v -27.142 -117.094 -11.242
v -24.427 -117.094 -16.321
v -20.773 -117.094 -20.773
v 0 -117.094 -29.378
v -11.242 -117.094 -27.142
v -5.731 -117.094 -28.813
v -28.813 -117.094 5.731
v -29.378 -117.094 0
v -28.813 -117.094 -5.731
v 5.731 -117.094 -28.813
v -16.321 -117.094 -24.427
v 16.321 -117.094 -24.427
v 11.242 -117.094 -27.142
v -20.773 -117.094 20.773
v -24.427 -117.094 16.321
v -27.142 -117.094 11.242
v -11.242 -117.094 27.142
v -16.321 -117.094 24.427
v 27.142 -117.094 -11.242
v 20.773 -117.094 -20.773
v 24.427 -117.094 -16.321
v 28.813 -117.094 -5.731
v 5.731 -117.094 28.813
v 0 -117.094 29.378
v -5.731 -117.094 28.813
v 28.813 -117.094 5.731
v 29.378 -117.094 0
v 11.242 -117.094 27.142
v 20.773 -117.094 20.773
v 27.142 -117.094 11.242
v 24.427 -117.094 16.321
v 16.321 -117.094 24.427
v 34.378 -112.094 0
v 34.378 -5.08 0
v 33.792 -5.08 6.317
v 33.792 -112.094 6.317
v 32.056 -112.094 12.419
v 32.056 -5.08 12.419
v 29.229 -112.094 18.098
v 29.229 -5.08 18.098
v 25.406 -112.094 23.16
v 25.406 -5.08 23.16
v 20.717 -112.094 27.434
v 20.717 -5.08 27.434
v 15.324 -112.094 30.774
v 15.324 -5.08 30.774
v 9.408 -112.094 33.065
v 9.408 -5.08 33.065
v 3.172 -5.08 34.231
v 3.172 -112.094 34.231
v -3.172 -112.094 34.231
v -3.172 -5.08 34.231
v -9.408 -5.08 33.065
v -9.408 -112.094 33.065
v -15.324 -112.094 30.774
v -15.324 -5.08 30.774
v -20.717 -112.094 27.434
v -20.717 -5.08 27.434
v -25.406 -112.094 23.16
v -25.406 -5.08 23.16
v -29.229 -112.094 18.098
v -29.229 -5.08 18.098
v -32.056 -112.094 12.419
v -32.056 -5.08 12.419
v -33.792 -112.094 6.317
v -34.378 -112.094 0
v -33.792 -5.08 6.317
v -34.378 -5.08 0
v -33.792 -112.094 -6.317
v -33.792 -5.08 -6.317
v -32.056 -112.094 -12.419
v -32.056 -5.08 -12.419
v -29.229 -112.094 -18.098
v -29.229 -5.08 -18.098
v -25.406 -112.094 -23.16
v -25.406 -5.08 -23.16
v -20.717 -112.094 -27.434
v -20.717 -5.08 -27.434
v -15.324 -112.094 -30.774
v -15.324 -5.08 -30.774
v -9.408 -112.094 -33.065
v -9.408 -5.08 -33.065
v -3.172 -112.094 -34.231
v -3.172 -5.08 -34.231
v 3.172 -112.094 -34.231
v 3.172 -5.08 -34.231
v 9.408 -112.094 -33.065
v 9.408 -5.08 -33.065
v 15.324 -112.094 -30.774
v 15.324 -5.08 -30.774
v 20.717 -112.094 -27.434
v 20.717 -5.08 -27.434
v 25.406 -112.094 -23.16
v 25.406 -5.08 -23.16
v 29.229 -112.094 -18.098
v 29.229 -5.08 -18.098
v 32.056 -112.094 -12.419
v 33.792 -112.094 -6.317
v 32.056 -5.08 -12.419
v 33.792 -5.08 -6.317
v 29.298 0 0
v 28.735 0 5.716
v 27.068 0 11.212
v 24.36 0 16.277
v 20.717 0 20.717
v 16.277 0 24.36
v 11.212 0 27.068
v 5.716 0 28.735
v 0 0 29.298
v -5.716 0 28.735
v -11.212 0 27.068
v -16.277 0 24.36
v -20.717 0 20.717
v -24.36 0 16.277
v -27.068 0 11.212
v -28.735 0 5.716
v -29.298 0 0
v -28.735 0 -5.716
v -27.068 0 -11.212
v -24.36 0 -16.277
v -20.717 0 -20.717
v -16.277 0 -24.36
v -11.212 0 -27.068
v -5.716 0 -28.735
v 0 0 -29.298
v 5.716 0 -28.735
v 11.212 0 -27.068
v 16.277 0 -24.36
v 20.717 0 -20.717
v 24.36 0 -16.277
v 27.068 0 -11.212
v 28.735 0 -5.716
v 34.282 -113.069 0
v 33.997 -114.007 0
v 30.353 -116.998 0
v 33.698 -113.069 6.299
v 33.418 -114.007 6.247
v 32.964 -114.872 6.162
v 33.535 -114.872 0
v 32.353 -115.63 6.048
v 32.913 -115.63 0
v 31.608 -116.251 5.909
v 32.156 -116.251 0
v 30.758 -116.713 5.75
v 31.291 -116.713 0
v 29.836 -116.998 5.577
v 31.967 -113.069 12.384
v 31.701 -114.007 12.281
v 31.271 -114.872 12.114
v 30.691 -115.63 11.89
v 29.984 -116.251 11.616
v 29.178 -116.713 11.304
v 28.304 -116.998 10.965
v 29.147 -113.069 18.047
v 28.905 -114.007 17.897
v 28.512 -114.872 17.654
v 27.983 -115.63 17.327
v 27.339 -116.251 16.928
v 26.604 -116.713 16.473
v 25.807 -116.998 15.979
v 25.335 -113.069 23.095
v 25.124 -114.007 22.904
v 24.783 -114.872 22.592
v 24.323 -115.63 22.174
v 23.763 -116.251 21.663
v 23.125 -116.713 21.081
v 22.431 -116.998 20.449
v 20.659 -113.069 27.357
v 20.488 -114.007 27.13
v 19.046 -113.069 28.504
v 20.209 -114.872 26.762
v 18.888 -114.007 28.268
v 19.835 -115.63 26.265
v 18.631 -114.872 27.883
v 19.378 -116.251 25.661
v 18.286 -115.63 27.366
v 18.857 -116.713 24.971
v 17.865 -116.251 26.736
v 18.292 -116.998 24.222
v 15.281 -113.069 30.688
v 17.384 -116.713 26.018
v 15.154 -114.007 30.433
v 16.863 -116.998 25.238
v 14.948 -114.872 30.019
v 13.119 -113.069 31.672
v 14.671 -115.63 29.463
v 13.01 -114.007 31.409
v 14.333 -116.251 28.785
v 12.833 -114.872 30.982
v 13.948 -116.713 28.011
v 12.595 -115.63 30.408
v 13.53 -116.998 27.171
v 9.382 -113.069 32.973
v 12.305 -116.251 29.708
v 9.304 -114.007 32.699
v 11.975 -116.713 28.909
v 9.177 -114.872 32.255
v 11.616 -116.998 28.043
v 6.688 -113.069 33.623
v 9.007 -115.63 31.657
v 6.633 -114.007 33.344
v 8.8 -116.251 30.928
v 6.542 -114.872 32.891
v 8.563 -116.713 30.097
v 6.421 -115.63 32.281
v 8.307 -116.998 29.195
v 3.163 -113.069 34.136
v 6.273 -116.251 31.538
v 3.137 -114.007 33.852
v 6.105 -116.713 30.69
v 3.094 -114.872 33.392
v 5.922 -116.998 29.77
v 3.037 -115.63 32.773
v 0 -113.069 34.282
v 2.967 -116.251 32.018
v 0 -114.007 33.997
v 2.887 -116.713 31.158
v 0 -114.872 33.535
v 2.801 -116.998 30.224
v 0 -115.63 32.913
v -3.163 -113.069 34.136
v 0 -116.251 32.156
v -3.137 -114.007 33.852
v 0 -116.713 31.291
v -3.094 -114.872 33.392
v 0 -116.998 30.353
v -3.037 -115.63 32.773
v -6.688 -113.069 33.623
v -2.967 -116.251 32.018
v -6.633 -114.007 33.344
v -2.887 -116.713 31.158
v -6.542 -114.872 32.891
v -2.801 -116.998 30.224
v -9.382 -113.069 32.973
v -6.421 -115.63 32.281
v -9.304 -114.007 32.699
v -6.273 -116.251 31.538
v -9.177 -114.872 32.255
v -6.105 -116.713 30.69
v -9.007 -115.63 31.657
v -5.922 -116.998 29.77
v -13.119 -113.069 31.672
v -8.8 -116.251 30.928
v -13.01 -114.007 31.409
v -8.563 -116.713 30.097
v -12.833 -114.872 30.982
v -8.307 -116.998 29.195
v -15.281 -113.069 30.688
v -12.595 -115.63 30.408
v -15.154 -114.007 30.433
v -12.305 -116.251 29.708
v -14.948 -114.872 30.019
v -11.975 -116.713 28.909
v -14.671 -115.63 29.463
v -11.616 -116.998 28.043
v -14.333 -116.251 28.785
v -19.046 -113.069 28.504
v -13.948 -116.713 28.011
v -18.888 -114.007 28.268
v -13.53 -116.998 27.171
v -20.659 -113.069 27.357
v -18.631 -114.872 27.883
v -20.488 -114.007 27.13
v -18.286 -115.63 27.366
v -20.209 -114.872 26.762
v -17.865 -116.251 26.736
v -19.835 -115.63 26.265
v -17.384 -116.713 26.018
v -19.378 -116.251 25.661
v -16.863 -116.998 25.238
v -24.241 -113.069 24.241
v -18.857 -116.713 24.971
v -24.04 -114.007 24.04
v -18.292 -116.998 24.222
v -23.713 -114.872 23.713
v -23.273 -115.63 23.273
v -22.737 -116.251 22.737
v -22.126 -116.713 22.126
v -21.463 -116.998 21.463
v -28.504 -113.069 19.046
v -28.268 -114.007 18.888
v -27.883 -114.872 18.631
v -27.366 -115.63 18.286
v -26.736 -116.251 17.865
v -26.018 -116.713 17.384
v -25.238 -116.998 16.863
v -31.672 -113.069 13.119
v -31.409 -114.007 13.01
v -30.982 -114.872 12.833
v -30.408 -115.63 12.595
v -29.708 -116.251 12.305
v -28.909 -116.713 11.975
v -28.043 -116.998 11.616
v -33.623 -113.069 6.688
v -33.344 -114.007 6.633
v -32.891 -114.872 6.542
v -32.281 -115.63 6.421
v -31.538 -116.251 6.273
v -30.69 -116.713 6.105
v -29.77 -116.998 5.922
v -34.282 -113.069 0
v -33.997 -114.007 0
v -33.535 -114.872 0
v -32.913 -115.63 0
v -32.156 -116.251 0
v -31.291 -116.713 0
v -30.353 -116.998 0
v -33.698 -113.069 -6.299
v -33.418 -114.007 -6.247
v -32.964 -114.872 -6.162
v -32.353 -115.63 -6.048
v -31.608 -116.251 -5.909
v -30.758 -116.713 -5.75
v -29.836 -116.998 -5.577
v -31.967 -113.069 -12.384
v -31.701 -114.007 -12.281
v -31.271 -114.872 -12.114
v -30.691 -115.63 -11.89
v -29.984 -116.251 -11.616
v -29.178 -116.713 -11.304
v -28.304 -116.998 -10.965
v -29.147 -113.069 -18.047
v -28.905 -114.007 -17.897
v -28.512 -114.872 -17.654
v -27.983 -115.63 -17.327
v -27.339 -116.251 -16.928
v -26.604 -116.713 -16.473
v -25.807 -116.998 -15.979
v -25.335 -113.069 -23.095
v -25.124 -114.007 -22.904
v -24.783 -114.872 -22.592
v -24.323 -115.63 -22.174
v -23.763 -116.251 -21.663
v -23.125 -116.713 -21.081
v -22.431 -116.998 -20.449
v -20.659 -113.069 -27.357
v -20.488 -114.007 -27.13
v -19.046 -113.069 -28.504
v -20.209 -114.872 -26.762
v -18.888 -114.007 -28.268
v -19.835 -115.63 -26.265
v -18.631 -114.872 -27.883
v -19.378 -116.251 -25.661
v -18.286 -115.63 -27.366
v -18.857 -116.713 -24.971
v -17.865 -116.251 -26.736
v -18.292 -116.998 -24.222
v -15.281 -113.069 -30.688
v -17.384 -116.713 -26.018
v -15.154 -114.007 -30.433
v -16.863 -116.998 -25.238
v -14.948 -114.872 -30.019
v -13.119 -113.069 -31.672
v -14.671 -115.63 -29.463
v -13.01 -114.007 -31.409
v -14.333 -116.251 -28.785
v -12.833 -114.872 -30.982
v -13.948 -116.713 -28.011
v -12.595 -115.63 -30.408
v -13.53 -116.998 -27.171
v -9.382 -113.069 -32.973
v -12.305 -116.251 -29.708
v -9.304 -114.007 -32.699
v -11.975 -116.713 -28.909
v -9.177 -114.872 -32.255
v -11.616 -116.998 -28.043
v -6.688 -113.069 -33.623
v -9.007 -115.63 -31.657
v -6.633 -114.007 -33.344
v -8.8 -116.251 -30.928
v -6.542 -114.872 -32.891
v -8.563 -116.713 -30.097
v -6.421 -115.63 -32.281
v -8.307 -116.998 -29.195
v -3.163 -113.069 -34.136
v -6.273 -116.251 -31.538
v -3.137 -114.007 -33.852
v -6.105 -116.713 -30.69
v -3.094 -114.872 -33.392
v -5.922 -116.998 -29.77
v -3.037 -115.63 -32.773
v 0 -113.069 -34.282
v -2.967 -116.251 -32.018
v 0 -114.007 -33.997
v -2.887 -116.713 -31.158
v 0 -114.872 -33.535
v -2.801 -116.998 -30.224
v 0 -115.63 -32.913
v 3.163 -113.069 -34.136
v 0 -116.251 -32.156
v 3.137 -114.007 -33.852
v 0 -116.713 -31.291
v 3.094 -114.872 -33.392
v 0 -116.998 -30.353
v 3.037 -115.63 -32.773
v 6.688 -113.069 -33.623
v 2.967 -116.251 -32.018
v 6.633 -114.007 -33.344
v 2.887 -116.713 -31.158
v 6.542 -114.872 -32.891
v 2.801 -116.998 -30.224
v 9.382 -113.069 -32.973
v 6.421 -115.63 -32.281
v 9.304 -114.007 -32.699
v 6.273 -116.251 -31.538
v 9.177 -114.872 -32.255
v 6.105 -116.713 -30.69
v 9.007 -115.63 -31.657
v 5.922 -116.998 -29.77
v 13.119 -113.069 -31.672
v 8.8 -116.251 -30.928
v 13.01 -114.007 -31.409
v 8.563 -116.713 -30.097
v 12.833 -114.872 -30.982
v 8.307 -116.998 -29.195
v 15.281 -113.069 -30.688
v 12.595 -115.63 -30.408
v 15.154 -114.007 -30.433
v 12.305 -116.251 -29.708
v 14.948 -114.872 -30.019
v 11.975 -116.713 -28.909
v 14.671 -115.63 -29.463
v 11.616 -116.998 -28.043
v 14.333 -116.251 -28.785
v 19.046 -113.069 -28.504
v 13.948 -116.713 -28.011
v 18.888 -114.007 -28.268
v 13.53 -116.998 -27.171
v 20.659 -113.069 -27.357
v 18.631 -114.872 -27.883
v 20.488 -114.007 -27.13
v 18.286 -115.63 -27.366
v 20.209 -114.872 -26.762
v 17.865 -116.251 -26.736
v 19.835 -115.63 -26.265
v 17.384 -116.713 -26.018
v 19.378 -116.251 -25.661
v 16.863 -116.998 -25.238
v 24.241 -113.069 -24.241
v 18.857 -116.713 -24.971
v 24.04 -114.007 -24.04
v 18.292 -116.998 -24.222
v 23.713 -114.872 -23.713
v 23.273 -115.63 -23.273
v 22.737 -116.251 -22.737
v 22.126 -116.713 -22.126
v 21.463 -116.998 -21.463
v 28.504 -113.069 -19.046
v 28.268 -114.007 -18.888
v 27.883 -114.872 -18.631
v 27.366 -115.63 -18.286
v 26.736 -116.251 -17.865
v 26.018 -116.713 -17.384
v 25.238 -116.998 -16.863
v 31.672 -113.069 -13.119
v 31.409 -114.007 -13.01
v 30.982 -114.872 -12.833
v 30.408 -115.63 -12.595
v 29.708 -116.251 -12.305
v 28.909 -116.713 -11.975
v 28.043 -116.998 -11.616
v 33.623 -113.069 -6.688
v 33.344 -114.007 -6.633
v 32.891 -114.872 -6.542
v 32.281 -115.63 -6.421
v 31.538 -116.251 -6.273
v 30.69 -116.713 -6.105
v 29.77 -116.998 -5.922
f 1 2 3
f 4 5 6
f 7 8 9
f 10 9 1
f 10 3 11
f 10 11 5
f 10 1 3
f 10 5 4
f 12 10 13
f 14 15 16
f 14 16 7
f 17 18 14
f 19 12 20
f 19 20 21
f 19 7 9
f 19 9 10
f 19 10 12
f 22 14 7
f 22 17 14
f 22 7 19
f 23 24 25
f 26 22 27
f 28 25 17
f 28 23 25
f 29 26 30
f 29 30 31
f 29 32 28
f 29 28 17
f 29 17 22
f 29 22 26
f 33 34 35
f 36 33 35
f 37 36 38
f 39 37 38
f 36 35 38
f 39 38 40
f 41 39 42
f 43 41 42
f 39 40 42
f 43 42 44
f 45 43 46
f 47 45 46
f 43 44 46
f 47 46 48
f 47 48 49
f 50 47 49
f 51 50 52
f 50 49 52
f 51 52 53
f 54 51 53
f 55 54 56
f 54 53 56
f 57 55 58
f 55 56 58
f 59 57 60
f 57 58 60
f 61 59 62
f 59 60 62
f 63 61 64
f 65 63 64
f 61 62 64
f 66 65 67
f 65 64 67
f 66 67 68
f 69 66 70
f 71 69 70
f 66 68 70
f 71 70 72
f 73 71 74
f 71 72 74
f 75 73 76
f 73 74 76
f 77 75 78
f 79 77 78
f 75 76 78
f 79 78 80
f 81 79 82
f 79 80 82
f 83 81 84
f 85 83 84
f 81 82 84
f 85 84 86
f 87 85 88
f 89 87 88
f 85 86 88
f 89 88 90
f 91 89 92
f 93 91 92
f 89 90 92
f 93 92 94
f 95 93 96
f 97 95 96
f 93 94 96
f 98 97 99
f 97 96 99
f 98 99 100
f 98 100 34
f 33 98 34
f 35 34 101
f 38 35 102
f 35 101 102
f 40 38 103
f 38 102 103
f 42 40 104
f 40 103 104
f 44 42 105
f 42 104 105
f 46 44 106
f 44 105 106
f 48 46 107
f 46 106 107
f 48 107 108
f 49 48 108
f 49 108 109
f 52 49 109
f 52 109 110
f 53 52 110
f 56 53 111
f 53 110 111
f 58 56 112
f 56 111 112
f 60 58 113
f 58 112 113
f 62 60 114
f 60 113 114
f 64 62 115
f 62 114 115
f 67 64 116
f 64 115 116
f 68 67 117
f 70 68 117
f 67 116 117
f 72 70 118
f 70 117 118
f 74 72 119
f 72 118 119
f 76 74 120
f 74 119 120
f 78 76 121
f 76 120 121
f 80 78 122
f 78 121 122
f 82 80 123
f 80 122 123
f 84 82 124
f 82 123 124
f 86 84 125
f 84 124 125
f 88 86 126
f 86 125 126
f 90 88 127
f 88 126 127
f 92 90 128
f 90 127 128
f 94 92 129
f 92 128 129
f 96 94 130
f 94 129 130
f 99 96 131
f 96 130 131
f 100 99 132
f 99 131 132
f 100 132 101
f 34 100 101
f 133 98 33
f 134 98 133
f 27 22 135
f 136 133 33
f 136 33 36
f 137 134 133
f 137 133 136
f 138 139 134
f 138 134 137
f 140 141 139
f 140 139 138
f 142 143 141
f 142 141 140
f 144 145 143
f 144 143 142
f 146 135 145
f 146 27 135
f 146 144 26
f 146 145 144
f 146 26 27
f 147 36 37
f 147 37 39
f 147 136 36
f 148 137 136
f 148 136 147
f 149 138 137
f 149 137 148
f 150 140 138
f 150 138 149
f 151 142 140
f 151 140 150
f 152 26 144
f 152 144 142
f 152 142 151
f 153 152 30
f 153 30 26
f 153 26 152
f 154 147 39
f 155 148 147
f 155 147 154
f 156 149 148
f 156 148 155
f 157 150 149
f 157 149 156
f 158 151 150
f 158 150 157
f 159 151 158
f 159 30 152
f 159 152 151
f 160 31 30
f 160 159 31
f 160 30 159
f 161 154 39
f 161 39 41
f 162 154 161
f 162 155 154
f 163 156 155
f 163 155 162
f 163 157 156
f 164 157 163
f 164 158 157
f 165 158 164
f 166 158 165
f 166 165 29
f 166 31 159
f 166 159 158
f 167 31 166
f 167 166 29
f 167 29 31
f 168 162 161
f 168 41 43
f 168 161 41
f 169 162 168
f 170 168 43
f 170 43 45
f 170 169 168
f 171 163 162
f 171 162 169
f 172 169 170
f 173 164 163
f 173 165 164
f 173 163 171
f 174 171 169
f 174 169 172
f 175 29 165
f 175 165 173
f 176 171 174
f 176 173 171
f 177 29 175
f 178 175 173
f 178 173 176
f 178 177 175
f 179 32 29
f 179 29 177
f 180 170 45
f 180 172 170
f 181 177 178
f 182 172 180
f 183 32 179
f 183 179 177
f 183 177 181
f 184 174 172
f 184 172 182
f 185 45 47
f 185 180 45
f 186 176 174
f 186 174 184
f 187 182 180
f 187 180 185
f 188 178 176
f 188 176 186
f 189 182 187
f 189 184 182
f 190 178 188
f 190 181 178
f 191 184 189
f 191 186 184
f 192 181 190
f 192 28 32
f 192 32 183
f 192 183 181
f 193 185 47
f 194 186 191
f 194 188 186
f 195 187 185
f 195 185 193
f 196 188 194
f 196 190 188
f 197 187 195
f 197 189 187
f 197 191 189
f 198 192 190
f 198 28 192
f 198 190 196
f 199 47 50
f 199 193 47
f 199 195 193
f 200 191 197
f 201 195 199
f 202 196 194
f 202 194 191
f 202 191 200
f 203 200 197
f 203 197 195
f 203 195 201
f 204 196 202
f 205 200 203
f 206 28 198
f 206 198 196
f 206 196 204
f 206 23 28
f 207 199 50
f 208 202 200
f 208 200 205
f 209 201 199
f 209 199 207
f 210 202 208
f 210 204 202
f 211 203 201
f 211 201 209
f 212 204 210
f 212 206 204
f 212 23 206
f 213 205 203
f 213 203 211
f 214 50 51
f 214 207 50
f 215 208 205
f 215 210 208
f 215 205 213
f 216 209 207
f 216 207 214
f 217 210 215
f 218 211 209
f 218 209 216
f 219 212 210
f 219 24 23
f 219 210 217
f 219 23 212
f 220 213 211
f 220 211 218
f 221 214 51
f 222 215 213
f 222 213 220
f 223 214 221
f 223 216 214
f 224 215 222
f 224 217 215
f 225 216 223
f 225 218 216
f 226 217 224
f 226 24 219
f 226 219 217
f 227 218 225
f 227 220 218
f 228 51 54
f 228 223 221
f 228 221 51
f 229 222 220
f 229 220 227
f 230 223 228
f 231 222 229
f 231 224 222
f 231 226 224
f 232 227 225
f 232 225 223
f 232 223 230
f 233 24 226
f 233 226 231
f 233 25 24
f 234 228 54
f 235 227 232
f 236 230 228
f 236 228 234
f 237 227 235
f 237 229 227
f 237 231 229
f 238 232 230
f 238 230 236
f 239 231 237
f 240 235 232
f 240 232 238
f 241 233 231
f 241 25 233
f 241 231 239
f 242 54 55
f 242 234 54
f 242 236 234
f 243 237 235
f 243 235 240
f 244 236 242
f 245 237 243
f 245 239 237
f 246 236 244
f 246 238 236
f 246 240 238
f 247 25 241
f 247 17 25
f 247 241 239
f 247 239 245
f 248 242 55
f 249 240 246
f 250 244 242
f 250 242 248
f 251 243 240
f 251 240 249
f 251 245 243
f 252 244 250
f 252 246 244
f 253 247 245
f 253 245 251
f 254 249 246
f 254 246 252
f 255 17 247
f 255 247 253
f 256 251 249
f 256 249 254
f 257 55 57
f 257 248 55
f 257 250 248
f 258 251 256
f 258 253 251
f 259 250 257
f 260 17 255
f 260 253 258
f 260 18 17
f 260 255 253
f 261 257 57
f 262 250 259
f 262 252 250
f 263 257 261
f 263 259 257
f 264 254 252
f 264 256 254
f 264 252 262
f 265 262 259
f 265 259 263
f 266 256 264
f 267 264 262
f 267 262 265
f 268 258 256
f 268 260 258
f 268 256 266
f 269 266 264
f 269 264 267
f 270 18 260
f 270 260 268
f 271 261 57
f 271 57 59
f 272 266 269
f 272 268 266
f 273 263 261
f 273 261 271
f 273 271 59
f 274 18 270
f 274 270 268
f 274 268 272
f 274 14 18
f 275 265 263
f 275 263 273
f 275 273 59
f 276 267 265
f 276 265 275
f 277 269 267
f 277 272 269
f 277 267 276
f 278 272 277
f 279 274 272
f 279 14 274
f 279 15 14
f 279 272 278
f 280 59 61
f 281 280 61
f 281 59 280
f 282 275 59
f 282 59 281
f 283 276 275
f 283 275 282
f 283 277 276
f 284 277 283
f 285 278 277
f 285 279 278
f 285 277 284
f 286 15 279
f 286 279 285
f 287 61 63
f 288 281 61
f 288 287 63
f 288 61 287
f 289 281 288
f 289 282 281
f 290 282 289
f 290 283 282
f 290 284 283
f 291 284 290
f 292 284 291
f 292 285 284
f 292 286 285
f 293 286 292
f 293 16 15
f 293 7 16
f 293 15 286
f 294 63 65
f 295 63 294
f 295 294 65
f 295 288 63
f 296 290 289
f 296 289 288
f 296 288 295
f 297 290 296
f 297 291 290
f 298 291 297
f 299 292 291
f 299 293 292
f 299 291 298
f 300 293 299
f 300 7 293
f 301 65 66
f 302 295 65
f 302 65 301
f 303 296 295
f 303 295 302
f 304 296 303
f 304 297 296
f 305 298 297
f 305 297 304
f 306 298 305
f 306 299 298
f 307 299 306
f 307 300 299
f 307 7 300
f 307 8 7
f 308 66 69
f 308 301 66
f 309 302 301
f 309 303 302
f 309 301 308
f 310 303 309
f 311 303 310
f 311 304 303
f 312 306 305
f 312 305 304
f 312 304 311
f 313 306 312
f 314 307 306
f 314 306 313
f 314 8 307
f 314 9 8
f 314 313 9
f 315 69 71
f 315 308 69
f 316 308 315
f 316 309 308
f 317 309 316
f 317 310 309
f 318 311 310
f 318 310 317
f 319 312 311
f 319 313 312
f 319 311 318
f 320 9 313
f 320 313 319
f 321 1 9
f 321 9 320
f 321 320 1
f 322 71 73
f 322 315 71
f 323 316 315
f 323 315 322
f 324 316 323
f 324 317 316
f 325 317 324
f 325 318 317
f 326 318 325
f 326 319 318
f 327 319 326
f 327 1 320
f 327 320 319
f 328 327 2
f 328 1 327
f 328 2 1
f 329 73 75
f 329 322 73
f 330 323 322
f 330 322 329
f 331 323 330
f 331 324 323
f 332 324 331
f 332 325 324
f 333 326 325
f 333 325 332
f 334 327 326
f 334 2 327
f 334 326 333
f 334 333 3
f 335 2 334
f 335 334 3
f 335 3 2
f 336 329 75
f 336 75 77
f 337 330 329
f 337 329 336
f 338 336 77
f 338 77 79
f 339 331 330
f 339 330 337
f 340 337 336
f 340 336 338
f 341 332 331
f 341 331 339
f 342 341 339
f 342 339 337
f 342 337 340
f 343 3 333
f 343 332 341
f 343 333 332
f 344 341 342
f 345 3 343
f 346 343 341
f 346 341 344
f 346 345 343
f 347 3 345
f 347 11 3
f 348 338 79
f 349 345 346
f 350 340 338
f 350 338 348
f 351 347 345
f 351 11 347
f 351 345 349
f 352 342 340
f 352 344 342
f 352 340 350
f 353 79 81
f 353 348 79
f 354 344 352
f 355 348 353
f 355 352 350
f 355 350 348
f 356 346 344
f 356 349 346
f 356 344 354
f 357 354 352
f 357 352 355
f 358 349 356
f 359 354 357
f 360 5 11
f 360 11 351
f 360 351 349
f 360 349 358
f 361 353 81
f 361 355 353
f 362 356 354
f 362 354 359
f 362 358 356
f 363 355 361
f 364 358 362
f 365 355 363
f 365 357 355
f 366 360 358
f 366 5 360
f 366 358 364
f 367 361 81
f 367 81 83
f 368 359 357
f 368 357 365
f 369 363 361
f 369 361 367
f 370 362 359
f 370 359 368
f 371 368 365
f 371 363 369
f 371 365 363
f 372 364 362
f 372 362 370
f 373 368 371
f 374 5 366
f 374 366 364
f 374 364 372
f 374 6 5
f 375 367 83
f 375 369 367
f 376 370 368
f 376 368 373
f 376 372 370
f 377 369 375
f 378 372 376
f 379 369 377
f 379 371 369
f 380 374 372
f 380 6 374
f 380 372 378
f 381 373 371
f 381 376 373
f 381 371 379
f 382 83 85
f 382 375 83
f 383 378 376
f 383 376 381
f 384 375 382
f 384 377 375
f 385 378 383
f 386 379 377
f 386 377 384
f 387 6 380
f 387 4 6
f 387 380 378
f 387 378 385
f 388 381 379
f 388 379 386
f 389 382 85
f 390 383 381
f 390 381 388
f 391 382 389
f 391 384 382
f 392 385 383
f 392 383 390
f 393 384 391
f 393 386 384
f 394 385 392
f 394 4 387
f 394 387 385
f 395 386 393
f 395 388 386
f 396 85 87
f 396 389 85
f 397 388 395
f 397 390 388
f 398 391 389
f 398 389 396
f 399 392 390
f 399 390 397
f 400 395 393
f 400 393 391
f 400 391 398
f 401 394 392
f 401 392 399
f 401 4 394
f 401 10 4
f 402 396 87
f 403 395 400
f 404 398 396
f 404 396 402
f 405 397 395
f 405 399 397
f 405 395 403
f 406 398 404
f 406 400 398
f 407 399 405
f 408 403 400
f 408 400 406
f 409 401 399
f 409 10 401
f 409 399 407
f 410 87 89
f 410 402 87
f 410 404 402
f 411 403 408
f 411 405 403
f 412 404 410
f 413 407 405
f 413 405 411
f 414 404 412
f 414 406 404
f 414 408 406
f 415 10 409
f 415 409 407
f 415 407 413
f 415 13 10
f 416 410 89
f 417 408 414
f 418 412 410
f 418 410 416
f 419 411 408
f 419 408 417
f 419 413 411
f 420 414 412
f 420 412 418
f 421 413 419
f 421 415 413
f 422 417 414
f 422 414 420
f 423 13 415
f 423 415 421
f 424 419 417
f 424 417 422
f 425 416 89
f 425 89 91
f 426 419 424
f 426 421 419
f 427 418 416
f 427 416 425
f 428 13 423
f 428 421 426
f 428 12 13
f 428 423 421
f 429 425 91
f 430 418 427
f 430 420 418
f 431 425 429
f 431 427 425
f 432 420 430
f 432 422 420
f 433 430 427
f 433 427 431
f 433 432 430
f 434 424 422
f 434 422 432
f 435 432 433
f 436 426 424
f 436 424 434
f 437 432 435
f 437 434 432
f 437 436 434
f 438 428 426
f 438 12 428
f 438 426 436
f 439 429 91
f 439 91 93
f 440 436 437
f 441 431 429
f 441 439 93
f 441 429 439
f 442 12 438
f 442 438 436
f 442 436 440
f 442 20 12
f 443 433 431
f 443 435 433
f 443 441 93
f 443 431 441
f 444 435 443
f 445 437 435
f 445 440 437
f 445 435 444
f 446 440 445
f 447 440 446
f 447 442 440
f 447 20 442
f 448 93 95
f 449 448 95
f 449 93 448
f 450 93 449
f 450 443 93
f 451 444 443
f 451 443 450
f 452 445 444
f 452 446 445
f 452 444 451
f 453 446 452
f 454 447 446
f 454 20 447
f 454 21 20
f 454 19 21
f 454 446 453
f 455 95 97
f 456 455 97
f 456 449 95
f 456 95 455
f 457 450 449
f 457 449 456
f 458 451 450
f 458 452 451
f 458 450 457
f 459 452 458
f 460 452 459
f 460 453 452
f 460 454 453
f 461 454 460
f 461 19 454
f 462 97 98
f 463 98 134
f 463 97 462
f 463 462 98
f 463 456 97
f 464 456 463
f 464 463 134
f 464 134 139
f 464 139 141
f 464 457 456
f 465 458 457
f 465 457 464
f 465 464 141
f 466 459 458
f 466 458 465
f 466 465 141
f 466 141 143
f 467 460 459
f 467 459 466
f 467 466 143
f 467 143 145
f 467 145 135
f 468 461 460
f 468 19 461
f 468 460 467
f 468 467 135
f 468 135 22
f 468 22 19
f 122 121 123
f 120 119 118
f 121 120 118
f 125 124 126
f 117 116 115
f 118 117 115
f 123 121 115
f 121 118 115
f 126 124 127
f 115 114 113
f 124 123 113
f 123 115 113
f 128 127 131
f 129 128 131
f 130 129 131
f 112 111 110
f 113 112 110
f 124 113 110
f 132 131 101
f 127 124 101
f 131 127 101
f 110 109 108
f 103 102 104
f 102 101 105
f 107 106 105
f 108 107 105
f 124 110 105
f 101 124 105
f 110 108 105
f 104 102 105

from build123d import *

# Parameters (mm, degrees)
F0_R     = 34.377817
F1_DEPTH = 117.094
F2_SIZE  = 5.08
F3_R     = 5


with BuildPart() as f1:
    # F0 (on Front) → F1 (new body)
    with BuildSketch(Plane.XZ):
        Circle(F0_R)
    extrude(amount=F1_DEPTH)

    # F2
    f2_edges = [f1.edges().sort_by_distance(p)[0] for p in [
        (-34.377817, 0, 0),
    ]]
    chamfer(f2_edges, length=F2_SIZE)

    # F3
    f3_edges = [f1.edges().sort_by_distance(p)[0] for p in [
        (-34.377817, -117.094, 0),
    ]]
    fillet(f3_edges, radius=F3_R)


solid = f1.part
